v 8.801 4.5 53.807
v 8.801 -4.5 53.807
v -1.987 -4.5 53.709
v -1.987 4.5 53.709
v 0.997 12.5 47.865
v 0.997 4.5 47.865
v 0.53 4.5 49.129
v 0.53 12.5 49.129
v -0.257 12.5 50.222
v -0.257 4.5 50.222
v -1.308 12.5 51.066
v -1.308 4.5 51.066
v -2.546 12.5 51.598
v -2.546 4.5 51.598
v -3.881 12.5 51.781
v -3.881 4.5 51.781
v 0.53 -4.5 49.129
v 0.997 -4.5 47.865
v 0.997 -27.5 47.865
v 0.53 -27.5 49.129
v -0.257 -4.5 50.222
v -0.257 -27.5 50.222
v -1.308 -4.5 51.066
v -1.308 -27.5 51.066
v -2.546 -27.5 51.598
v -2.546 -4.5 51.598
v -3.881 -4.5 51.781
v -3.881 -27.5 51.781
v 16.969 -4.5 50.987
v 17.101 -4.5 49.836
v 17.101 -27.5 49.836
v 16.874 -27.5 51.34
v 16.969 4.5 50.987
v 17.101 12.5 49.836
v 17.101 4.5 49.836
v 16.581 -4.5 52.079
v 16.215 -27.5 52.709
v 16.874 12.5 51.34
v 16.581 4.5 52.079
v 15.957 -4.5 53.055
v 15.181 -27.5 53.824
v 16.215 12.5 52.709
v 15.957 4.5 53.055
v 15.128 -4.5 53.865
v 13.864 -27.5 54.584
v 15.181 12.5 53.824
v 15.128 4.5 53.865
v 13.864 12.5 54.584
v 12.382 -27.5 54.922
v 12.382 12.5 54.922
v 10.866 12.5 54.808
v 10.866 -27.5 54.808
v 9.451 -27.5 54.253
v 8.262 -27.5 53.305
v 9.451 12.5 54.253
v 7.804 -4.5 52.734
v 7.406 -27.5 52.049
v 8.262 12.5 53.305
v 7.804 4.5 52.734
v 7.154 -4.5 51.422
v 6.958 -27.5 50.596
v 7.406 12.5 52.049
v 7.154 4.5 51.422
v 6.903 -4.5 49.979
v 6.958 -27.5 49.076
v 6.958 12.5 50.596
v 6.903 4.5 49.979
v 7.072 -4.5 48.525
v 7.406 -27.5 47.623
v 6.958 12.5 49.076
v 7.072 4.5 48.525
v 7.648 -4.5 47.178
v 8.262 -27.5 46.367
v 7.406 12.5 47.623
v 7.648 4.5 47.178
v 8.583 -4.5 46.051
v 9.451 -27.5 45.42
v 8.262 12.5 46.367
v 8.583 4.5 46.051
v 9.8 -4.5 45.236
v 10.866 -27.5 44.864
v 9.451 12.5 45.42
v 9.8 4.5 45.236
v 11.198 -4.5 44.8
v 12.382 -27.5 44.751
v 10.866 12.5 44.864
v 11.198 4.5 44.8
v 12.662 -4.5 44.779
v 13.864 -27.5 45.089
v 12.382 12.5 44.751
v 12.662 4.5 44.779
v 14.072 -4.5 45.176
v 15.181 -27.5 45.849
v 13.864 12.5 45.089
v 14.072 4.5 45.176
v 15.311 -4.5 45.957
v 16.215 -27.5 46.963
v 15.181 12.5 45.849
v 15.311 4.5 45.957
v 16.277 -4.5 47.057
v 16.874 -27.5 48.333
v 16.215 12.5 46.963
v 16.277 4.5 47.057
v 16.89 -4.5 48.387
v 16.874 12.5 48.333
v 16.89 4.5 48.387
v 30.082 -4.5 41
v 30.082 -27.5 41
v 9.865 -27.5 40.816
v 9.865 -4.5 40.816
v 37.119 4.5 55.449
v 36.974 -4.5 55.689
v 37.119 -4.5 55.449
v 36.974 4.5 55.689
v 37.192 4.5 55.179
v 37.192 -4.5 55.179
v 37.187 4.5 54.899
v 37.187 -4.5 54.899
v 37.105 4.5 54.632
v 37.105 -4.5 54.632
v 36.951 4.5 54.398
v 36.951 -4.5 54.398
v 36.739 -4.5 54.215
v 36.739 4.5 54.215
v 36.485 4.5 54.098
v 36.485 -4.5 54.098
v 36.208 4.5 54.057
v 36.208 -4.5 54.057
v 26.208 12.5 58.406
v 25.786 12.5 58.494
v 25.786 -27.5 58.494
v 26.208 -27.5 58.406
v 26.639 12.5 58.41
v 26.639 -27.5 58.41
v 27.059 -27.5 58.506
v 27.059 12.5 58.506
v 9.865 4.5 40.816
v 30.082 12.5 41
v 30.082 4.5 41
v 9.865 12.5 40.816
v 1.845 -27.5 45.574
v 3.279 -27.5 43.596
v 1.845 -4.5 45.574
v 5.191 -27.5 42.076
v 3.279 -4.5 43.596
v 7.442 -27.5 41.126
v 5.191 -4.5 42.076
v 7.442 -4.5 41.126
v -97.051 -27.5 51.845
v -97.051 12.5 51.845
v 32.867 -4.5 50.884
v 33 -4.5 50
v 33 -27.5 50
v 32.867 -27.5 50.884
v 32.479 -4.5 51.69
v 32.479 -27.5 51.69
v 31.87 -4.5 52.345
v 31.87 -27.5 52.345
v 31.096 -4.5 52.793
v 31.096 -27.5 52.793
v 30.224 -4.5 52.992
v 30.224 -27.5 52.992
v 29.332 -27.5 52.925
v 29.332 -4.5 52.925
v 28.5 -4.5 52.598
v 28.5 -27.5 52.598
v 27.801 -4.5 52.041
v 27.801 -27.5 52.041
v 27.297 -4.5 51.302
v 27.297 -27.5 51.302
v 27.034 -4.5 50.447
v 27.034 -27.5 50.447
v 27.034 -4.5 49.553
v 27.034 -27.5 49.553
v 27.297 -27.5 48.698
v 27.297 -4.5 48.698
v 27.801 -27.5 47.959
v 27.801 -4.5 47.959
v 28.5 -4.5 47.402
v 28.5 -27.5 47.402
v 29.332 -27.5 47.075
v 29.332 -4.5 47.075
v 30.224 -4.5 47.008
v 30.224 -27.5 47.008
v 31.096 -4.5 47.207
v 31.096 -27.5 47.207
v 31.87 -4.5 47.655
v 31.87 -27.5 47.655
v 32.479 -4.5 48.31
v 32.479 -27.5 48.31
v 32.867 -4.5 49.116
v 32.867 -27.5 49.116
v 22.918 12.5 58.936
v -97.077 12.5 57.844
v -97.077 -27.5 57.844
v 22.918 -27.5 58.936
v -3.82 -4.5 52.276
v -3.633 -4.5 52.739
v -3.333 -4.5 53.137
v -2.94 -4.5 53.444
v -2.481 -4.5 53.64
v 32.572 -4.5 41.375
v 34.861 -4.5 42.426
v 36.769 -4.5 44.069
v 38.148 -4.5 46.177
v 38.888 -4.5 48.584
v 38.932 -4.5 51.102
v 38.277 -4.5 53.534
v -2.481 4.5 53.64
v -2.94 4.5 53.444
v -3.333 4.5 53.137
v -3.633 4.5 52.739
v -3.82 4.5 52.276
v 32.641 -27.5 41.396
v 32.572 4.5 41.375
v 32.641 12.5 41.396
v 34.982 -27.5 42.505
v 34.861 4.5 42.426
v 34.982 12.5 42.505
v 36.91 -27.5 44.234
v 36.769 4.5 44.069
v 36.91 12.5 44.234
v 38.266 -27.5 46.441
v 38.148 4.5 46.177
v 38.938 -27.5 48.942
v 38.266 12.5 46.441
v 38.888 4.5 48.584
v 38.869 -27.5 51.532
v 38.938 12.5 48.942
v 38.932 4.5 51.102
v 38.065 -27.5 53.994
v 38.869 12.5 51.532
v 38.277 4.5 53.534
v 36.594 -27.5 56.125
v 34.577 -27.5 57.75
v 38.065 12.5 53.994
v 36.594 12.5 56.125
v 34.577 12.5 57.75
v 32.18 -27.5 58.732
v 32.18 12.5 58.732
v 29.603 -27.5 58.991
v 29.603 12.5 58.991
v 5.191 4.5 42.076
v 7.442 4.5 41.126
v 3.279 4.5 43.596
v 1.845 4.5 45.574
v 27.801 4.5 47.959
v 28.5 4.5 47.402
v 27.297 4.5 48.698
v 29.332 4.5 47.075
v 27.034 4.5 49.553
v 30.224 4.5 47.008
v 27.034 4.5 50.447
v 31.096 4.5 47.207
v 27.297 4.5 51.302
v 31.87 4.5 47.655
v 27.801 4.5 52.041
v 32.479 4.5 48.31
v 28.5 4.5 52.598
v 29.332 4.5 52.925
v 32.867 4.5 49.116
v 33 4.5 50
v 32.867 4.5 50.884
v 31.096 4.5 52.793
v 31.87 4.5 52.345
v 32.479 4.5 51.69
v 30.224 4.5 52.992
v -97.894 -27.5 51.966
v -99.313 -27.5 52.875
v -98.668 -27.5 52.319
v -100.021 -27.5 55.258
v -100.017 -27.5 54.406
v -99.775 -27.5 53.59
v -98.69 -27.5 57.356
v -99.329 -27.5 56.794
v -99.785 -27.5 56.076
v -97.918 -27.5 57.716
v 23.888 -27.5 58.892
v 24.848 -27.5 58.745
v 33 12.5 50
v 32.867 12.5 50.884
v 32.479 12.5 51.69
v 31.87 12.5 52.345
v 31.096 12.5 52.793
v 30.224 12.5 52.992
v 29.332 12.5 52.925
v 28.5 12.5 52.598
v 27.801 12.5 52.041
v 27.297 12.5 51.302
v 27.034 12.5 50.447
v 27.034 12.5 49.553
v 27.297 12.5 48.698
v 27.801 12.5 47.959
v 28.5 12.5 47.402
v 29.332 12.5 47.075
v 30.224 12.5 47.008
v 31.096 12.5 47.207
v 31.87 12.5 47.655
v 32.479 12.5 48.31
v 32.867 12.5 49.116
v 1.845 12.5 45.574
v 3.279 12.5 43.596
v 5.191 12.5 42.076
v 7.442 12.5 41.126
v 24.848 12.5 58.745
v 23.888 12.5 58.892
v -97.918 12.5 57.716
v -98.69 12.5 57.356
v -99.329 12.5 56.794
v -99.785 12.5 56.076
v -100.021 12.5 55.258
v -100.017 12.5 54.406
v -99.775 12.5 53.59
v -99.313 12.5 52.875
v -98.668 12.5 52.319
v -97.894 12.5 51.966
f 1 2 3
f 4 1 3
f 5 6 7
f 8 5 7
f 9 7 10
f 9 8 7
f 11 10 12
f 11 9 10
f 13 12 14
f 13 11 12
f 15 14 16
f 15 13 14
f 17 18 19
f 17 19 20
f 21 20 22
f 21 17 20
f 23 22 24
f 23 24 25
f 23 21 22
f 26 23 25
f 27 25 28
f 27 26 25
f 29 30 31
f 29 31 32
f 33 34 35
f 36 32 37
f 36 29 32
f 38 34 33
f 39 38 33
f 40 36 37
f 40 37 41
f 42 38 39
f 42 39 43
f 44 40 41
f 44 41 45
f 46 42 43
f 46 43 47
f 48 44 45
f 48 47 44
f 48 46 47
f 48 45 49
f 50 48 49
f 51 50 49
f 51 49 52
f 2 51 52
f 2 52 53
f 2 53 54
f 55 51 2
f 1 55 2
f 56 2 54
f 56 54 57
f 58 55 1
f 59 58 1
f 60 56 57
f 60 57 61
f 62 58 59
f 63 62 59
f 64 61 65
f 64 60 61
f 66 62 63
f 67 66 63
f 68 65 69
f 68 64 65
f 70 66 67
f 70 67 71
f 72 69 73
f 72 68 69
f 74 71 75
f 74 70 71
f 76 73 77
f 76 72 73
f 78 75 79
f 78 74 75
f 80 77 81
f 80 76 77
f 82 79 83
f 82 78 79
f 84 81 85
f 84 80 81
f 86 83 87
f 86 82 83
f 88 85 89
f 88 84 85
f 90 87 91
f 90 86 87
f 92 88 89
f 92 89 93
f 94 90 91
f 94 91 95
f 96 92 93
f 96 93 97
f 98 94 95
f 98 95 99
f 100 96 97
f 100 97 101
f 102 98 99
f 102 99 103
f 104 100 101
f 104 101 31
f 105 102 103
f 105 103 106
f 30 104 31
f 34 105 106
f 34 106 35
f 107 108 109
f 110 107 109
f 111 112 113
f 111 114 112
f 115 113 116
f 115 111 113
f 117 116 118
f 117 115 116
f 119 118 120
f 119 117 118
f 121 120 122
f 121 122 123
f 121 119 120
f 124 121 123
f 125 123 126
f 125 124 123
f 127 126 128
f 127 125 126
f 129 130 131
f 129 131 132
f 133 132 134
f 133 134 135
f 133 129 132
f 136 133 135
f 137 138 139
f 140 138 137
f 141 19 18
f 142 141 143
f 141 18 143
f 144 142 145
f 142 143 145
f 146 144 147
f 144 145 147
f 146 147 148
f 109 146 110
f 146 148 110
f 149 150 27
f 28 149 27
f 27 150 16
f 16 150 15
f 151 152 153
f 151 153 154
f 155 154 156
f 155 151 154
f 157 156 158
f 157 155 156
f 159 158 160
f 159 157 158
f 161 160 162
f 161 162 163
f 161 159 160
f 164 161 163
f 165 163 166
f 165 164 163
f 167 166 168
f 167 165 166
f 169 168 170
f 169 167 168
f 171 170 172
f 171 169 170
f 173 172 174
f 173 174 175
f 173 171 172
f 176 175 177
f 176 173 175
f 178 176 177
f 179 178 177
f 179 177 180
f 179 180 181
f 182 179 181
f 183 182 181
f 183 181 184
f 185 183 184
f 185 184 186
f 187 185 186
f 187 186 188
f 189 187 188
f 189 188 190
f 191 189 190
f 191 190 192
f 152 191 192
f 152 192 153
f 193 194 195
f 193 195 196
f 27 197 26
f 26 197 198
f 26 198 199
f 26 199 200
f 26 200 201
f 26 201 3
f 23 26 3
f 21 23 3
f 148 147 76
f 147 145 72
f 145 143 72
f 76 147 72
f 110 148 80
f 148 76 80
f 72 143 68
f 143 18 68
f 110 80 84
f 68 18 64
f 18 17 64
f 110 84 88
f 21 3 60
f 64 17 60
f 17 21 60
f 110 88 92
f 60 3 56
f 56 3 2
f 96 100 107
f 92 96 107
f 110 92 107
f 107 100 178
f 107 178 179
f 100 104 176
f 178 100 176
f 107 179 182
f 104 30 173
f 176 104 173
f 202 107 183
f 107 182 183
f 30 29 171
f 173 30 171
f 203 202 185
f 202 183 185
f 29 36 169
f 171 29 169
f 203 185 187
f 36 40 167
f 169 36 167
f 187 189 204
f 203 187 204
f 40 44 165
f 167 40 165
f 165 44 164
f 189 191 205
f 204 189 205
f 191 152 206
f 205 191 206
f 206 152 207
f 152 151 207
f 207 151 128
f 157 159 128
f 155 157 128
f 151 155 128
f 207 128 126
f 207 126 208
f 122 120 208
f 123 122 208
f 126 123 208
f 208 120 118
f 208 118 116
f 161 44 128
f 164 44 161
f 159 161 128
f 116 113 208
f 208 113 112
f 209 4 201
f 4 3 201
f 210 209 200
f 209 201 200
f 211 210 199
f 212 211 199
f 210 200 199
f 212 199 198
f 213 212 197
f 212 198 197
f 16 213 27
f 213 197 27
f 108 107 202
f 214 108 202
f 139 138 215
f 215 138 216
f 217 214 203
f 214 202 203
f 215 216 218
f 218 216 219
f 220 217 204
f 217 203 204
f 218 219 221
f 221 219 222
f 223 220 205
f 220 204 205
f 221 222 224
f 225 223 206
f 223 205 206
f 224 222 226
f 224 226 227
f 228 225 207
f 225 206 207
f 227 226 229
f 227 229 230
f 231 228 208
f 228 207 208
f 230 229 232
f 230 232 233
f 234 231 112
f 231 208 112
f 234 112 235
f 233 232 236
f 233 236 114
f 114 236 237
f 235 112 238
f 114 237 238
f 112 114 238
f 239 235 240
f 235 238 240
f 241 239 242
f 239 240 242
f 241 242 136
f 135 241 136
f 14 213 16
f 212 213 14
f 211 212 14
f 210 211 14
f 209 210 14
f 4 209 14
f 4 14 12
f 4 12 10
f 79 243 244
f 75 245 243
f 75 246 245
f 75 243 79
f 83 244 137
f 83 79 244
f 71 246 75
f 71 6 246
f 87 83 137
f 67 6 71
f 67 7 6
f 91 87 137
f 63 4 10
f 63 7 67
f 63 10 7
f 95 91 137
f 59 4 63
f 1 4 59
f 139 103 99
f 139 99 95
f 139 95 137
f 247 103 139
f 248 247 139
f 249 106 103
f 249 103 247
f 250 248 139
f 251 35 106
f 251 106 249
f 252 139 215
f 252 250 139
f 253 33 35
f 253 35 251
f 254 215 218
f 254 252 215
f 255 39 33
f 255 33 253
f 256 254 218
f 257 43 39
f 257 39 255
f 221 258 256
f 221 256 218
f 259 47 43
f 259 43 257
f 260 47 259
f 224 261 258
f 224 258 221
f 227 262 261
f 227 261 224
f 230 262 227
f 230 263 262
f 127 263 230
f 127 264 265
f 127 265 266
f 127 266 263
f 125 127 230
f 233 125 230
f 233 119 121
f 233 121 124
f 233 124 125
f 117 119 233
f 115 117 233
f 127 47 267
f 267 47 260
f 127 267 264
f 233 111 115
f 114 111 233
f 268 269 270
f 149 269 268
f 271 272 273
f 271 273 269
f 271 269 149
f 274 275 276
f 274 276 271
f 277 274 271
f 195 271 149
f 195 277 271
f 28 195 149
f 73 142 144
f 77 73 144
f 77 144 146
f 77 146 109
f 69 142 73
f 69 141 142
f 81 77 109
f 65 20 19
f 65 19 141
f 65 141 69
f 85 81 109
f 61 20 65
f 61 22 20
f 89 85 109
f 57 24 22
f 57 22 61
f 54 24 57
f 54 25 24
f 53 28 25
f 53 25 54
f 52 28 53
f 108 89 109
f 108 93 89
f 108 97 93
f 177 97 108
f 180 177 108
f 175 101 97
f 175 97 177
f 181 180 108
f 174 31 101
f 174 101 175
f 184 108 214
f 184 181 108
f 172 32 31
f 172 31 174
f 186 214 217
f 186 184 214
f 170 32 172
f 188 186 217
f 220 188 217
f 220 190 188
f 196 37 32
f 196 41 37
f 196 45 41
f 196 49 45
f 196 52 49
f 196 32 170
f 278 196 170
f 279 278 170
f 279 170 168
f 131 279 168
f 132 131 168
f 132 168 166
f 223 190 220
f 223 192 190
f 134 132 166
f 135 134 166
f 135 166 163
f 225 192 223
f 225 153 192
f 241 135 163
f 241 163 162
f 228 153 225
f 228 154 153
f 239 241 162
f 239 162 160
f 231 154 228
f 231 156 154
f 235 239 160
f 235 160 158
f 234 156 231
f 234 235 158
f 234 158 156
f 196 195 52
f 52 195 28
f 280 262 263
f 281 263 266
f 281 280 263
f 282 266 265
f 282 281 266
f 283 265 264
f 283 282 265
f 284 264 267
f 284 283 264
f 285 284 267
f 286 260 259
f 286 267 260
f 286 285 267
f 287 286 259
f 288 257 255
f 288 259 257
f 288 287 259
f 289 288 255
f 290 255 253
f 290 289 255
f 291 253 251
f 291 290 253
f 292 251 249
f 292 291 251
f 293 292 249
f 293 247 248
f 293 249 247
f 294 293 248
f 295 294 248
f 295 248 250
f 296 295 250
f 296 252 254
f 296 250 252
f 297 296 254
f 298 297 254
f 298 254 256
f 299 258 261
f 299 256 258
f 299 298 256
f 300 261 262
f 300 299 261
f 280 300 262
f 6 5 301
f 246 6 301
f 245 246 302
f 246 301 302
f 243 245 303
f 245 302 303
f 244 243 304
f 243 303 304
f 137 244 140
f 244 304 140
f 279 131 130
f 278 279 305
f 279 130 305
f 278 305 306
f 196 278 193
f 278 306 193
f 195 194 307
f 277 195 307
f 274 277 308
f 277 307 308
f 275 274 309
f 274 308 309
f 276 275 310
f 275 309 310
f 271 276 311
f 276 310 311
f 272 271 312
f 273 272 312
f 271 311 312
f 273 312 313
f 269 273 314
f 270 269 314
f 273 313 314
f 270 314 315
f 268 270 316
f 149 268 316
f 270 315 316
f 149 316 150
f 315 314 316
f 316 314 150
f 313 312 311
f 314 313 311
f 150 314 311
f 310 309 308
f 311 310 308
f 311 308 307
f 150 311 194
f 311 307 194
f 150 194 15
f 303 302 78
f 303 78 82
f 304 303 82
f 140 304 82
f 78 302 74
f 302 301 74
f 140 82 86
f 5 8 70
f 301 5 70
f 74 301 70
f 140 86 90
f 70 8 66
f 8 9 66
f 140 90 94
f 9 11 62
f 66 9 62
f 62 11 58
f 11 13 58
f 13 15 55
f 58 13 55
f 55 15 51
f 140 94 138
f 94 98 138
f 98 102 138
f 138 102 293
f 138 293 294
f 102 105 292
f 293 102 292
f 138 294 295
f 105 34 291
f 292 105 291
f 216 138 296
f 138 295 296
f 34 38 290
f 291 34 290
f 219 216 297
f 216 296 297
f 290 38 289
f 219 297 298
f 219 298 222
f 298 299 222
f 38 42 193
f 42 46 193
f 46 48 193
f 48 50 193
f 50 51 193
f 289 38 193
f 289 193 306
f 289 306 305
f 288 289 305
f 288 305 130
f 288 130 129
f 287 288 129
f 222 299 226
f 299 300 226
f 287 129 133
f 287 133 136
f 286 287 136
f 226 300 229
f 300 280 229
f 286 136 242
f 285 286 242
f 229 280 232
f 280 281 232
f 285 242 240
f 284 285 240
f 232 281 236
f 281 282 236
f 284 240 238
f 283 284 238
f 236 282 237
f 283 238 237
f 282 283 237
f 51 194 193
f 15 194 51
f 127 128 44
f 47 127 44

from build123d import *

# Parameters (mm, degrees)
SKETCH006_R   = 3
SKETCH006_R_2 = 5.1
PAD003_DEPTH  = 40
POCKET_DEPTH  = 4.5
FILLET_R      = 1


with BuildPart() as part:
    # Sketch006 → Pad003 (new body)
    with BuildSketch(Plane.XZ.offset(-12.5)):
        with BuildLine():
            ThreePointArc((30.081867, 41.000372), (38.868733, 51.531528), (27.05887, 58.505866))
            ThreePointArc((25.786195, 58.494289), (26.423478, 58.396141), (27.05887, 58.505866))
            ThreePointArc((25.786195, 58.494289), (24.370225, 58.831452), (22.918423, 58.935953))
            Line((-97.076613, 57.844394), (22.918423, 58.935953))
            ThreePointArc((-97.076613, 57.844394), (-100.049297, 54.831898), (-97.051373, 51.844519))
            Line((-97.051373, 51.844519), (-3.880643, 51.780882))
            ThreePointArc((0.997022, 47.864886), (-0.75383, 50.679815), (-3.880643, 51.780882))
            ThreePointArc((0.997022, 47.864886), (4.182938, 42.770547), (9.864832, 40.816464))
            Line((30.081867, 41.000372), (9.864832, 40.816464))
        make_face()
        with Locations((30, 50)):
            Circle(SKETCH006_R, mode=Mode.SUBTRACT)
        with Locations((12.000745, 49.836266)):
            Circle(SKETCH006_R_2, mode=Mode.SUBTRACT)
    extrude(amount=PAD003_DEPTH)

    # Sketch007 → Pocket (cut, symmetric)
    with BuildSketch(Plane.XZ):
        with BuildLine():
            Line((-3.770677, 39.692385), (42.090467, 40.10957))
            Line((42.090467, 40.10957), (41.963118, 54.10899))
            Line((41.963118, 54.10899), (-1.987102, 53.709188))
            ThreePointArc((-1.987102, 53.709188), (-3.333238, 53.1372), (-3.880643, 51.780882))
            Line((-3.770677, 39.692385), (-3.880643, 51.780882))
        make_face()
    extrude(amount=POCKET_DEPTH, both=True, mode=Mode.SUBTRACT)

    # Fillet
    fillet_edges = [part.edges().sort_by_distance(p)[0] for p in [
        (38.025539, 0, 54.073171),
    ]]
    fillet(fillet_edges, radius=FILLET_R)


solid = part.part
